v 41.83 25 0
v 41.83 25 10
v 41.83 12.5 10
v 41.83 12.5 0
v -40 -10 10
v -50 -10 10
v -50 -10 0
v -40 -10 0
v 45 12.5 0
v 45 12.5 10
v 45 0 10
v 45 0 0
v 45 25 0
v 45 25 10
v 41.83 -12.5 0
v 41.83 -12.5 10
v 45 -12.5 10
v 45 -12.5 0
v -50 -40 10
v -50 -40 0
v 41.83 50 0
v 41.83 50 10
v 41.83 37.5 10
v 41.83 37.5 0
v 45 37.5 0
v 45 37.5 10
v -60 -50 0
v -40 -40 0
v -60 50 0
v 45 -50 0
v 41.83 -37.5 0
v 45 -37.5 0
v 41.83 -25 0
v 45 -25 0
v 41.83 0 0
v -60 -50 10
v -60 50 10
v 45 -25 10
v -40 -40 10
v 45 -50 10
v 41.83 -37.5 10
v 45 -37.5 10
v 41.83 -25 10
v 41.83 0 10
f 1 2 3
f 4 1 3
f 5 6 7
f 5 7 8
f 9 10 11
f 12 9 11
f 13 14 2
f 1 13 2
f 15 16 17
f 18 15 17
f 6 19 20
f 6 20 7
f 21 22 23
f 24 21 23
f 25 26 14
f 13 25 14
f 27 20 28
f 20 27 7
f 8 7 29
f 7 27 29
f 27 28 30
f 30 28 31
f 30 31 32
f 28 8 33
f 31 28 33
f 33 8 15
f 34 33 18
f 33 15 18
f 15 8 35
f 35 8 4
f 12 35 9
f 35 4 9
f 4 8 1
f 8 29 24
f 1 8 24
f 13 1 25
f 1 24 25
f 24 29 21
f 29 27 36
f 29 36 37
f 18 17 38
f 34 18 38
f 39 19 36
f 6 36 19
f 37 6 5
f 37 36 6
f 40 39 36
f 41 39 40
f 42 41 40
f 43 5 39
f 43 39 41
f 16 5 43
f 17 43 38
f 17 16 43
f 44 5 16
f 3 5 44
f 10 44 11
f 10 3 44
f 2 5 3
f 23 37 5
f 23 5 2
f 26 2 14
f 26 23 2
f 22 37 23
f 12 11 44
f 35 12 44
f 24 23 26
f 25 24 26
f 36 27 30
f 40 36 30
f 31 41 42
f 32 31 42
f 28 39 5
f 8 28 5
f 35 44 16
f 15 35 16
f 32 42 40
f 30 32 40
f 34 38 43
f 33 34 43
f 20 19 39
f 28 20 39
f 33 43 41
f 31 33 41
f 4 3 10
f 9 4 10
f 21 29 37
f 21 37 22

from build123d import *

# Parameters (mm, degrees)
F0_W     = 120
F0_H     = 100
F1_DEPTH = 10
F2_W     = 10
F2_H     = 30
F3_DEPTH = 10.001
F5_DEPTH = 25


with BuildPart() as f1:
    # F0 (on Top) → F1 (new body)
    with BuildSketch(Plane.XY):
        Rectangle(F0_W, F0_H)
    extrude(amount=F1_DEPTH)

    # F2 (on face) → F3 (cut, through all)
    with BuildSketch(Plane.XY.offset(10)):
        with Locations((-45, -25)):
            Rectangle(F2_W, F2_H)
    extrude(amount=-F3_DEPTH, mode=Mode.SUBTRACT)

    # F4 (on face) → F5 (cut)
    with BuildSketch(Plane.XY.offset(10)):
        Polygon((45, -50), (60, -50), (60, 50), (41.829597, 50), (41.829597, 37.5), (45, 37.5), (45, 25), (41.829597, 25), (41.829597, 12.5), (45, 12.5), (45, 0), (41.829597, 0), (41.829597, -12.5), (45, -12.5), (45, -25), (41.829597, -25), (41.829597, -37.5), (45, -37.5), align=None)
    extrude(amount=-F5_DEPTH, mode=Mode.SUBTRACT)


solid = f1.part
